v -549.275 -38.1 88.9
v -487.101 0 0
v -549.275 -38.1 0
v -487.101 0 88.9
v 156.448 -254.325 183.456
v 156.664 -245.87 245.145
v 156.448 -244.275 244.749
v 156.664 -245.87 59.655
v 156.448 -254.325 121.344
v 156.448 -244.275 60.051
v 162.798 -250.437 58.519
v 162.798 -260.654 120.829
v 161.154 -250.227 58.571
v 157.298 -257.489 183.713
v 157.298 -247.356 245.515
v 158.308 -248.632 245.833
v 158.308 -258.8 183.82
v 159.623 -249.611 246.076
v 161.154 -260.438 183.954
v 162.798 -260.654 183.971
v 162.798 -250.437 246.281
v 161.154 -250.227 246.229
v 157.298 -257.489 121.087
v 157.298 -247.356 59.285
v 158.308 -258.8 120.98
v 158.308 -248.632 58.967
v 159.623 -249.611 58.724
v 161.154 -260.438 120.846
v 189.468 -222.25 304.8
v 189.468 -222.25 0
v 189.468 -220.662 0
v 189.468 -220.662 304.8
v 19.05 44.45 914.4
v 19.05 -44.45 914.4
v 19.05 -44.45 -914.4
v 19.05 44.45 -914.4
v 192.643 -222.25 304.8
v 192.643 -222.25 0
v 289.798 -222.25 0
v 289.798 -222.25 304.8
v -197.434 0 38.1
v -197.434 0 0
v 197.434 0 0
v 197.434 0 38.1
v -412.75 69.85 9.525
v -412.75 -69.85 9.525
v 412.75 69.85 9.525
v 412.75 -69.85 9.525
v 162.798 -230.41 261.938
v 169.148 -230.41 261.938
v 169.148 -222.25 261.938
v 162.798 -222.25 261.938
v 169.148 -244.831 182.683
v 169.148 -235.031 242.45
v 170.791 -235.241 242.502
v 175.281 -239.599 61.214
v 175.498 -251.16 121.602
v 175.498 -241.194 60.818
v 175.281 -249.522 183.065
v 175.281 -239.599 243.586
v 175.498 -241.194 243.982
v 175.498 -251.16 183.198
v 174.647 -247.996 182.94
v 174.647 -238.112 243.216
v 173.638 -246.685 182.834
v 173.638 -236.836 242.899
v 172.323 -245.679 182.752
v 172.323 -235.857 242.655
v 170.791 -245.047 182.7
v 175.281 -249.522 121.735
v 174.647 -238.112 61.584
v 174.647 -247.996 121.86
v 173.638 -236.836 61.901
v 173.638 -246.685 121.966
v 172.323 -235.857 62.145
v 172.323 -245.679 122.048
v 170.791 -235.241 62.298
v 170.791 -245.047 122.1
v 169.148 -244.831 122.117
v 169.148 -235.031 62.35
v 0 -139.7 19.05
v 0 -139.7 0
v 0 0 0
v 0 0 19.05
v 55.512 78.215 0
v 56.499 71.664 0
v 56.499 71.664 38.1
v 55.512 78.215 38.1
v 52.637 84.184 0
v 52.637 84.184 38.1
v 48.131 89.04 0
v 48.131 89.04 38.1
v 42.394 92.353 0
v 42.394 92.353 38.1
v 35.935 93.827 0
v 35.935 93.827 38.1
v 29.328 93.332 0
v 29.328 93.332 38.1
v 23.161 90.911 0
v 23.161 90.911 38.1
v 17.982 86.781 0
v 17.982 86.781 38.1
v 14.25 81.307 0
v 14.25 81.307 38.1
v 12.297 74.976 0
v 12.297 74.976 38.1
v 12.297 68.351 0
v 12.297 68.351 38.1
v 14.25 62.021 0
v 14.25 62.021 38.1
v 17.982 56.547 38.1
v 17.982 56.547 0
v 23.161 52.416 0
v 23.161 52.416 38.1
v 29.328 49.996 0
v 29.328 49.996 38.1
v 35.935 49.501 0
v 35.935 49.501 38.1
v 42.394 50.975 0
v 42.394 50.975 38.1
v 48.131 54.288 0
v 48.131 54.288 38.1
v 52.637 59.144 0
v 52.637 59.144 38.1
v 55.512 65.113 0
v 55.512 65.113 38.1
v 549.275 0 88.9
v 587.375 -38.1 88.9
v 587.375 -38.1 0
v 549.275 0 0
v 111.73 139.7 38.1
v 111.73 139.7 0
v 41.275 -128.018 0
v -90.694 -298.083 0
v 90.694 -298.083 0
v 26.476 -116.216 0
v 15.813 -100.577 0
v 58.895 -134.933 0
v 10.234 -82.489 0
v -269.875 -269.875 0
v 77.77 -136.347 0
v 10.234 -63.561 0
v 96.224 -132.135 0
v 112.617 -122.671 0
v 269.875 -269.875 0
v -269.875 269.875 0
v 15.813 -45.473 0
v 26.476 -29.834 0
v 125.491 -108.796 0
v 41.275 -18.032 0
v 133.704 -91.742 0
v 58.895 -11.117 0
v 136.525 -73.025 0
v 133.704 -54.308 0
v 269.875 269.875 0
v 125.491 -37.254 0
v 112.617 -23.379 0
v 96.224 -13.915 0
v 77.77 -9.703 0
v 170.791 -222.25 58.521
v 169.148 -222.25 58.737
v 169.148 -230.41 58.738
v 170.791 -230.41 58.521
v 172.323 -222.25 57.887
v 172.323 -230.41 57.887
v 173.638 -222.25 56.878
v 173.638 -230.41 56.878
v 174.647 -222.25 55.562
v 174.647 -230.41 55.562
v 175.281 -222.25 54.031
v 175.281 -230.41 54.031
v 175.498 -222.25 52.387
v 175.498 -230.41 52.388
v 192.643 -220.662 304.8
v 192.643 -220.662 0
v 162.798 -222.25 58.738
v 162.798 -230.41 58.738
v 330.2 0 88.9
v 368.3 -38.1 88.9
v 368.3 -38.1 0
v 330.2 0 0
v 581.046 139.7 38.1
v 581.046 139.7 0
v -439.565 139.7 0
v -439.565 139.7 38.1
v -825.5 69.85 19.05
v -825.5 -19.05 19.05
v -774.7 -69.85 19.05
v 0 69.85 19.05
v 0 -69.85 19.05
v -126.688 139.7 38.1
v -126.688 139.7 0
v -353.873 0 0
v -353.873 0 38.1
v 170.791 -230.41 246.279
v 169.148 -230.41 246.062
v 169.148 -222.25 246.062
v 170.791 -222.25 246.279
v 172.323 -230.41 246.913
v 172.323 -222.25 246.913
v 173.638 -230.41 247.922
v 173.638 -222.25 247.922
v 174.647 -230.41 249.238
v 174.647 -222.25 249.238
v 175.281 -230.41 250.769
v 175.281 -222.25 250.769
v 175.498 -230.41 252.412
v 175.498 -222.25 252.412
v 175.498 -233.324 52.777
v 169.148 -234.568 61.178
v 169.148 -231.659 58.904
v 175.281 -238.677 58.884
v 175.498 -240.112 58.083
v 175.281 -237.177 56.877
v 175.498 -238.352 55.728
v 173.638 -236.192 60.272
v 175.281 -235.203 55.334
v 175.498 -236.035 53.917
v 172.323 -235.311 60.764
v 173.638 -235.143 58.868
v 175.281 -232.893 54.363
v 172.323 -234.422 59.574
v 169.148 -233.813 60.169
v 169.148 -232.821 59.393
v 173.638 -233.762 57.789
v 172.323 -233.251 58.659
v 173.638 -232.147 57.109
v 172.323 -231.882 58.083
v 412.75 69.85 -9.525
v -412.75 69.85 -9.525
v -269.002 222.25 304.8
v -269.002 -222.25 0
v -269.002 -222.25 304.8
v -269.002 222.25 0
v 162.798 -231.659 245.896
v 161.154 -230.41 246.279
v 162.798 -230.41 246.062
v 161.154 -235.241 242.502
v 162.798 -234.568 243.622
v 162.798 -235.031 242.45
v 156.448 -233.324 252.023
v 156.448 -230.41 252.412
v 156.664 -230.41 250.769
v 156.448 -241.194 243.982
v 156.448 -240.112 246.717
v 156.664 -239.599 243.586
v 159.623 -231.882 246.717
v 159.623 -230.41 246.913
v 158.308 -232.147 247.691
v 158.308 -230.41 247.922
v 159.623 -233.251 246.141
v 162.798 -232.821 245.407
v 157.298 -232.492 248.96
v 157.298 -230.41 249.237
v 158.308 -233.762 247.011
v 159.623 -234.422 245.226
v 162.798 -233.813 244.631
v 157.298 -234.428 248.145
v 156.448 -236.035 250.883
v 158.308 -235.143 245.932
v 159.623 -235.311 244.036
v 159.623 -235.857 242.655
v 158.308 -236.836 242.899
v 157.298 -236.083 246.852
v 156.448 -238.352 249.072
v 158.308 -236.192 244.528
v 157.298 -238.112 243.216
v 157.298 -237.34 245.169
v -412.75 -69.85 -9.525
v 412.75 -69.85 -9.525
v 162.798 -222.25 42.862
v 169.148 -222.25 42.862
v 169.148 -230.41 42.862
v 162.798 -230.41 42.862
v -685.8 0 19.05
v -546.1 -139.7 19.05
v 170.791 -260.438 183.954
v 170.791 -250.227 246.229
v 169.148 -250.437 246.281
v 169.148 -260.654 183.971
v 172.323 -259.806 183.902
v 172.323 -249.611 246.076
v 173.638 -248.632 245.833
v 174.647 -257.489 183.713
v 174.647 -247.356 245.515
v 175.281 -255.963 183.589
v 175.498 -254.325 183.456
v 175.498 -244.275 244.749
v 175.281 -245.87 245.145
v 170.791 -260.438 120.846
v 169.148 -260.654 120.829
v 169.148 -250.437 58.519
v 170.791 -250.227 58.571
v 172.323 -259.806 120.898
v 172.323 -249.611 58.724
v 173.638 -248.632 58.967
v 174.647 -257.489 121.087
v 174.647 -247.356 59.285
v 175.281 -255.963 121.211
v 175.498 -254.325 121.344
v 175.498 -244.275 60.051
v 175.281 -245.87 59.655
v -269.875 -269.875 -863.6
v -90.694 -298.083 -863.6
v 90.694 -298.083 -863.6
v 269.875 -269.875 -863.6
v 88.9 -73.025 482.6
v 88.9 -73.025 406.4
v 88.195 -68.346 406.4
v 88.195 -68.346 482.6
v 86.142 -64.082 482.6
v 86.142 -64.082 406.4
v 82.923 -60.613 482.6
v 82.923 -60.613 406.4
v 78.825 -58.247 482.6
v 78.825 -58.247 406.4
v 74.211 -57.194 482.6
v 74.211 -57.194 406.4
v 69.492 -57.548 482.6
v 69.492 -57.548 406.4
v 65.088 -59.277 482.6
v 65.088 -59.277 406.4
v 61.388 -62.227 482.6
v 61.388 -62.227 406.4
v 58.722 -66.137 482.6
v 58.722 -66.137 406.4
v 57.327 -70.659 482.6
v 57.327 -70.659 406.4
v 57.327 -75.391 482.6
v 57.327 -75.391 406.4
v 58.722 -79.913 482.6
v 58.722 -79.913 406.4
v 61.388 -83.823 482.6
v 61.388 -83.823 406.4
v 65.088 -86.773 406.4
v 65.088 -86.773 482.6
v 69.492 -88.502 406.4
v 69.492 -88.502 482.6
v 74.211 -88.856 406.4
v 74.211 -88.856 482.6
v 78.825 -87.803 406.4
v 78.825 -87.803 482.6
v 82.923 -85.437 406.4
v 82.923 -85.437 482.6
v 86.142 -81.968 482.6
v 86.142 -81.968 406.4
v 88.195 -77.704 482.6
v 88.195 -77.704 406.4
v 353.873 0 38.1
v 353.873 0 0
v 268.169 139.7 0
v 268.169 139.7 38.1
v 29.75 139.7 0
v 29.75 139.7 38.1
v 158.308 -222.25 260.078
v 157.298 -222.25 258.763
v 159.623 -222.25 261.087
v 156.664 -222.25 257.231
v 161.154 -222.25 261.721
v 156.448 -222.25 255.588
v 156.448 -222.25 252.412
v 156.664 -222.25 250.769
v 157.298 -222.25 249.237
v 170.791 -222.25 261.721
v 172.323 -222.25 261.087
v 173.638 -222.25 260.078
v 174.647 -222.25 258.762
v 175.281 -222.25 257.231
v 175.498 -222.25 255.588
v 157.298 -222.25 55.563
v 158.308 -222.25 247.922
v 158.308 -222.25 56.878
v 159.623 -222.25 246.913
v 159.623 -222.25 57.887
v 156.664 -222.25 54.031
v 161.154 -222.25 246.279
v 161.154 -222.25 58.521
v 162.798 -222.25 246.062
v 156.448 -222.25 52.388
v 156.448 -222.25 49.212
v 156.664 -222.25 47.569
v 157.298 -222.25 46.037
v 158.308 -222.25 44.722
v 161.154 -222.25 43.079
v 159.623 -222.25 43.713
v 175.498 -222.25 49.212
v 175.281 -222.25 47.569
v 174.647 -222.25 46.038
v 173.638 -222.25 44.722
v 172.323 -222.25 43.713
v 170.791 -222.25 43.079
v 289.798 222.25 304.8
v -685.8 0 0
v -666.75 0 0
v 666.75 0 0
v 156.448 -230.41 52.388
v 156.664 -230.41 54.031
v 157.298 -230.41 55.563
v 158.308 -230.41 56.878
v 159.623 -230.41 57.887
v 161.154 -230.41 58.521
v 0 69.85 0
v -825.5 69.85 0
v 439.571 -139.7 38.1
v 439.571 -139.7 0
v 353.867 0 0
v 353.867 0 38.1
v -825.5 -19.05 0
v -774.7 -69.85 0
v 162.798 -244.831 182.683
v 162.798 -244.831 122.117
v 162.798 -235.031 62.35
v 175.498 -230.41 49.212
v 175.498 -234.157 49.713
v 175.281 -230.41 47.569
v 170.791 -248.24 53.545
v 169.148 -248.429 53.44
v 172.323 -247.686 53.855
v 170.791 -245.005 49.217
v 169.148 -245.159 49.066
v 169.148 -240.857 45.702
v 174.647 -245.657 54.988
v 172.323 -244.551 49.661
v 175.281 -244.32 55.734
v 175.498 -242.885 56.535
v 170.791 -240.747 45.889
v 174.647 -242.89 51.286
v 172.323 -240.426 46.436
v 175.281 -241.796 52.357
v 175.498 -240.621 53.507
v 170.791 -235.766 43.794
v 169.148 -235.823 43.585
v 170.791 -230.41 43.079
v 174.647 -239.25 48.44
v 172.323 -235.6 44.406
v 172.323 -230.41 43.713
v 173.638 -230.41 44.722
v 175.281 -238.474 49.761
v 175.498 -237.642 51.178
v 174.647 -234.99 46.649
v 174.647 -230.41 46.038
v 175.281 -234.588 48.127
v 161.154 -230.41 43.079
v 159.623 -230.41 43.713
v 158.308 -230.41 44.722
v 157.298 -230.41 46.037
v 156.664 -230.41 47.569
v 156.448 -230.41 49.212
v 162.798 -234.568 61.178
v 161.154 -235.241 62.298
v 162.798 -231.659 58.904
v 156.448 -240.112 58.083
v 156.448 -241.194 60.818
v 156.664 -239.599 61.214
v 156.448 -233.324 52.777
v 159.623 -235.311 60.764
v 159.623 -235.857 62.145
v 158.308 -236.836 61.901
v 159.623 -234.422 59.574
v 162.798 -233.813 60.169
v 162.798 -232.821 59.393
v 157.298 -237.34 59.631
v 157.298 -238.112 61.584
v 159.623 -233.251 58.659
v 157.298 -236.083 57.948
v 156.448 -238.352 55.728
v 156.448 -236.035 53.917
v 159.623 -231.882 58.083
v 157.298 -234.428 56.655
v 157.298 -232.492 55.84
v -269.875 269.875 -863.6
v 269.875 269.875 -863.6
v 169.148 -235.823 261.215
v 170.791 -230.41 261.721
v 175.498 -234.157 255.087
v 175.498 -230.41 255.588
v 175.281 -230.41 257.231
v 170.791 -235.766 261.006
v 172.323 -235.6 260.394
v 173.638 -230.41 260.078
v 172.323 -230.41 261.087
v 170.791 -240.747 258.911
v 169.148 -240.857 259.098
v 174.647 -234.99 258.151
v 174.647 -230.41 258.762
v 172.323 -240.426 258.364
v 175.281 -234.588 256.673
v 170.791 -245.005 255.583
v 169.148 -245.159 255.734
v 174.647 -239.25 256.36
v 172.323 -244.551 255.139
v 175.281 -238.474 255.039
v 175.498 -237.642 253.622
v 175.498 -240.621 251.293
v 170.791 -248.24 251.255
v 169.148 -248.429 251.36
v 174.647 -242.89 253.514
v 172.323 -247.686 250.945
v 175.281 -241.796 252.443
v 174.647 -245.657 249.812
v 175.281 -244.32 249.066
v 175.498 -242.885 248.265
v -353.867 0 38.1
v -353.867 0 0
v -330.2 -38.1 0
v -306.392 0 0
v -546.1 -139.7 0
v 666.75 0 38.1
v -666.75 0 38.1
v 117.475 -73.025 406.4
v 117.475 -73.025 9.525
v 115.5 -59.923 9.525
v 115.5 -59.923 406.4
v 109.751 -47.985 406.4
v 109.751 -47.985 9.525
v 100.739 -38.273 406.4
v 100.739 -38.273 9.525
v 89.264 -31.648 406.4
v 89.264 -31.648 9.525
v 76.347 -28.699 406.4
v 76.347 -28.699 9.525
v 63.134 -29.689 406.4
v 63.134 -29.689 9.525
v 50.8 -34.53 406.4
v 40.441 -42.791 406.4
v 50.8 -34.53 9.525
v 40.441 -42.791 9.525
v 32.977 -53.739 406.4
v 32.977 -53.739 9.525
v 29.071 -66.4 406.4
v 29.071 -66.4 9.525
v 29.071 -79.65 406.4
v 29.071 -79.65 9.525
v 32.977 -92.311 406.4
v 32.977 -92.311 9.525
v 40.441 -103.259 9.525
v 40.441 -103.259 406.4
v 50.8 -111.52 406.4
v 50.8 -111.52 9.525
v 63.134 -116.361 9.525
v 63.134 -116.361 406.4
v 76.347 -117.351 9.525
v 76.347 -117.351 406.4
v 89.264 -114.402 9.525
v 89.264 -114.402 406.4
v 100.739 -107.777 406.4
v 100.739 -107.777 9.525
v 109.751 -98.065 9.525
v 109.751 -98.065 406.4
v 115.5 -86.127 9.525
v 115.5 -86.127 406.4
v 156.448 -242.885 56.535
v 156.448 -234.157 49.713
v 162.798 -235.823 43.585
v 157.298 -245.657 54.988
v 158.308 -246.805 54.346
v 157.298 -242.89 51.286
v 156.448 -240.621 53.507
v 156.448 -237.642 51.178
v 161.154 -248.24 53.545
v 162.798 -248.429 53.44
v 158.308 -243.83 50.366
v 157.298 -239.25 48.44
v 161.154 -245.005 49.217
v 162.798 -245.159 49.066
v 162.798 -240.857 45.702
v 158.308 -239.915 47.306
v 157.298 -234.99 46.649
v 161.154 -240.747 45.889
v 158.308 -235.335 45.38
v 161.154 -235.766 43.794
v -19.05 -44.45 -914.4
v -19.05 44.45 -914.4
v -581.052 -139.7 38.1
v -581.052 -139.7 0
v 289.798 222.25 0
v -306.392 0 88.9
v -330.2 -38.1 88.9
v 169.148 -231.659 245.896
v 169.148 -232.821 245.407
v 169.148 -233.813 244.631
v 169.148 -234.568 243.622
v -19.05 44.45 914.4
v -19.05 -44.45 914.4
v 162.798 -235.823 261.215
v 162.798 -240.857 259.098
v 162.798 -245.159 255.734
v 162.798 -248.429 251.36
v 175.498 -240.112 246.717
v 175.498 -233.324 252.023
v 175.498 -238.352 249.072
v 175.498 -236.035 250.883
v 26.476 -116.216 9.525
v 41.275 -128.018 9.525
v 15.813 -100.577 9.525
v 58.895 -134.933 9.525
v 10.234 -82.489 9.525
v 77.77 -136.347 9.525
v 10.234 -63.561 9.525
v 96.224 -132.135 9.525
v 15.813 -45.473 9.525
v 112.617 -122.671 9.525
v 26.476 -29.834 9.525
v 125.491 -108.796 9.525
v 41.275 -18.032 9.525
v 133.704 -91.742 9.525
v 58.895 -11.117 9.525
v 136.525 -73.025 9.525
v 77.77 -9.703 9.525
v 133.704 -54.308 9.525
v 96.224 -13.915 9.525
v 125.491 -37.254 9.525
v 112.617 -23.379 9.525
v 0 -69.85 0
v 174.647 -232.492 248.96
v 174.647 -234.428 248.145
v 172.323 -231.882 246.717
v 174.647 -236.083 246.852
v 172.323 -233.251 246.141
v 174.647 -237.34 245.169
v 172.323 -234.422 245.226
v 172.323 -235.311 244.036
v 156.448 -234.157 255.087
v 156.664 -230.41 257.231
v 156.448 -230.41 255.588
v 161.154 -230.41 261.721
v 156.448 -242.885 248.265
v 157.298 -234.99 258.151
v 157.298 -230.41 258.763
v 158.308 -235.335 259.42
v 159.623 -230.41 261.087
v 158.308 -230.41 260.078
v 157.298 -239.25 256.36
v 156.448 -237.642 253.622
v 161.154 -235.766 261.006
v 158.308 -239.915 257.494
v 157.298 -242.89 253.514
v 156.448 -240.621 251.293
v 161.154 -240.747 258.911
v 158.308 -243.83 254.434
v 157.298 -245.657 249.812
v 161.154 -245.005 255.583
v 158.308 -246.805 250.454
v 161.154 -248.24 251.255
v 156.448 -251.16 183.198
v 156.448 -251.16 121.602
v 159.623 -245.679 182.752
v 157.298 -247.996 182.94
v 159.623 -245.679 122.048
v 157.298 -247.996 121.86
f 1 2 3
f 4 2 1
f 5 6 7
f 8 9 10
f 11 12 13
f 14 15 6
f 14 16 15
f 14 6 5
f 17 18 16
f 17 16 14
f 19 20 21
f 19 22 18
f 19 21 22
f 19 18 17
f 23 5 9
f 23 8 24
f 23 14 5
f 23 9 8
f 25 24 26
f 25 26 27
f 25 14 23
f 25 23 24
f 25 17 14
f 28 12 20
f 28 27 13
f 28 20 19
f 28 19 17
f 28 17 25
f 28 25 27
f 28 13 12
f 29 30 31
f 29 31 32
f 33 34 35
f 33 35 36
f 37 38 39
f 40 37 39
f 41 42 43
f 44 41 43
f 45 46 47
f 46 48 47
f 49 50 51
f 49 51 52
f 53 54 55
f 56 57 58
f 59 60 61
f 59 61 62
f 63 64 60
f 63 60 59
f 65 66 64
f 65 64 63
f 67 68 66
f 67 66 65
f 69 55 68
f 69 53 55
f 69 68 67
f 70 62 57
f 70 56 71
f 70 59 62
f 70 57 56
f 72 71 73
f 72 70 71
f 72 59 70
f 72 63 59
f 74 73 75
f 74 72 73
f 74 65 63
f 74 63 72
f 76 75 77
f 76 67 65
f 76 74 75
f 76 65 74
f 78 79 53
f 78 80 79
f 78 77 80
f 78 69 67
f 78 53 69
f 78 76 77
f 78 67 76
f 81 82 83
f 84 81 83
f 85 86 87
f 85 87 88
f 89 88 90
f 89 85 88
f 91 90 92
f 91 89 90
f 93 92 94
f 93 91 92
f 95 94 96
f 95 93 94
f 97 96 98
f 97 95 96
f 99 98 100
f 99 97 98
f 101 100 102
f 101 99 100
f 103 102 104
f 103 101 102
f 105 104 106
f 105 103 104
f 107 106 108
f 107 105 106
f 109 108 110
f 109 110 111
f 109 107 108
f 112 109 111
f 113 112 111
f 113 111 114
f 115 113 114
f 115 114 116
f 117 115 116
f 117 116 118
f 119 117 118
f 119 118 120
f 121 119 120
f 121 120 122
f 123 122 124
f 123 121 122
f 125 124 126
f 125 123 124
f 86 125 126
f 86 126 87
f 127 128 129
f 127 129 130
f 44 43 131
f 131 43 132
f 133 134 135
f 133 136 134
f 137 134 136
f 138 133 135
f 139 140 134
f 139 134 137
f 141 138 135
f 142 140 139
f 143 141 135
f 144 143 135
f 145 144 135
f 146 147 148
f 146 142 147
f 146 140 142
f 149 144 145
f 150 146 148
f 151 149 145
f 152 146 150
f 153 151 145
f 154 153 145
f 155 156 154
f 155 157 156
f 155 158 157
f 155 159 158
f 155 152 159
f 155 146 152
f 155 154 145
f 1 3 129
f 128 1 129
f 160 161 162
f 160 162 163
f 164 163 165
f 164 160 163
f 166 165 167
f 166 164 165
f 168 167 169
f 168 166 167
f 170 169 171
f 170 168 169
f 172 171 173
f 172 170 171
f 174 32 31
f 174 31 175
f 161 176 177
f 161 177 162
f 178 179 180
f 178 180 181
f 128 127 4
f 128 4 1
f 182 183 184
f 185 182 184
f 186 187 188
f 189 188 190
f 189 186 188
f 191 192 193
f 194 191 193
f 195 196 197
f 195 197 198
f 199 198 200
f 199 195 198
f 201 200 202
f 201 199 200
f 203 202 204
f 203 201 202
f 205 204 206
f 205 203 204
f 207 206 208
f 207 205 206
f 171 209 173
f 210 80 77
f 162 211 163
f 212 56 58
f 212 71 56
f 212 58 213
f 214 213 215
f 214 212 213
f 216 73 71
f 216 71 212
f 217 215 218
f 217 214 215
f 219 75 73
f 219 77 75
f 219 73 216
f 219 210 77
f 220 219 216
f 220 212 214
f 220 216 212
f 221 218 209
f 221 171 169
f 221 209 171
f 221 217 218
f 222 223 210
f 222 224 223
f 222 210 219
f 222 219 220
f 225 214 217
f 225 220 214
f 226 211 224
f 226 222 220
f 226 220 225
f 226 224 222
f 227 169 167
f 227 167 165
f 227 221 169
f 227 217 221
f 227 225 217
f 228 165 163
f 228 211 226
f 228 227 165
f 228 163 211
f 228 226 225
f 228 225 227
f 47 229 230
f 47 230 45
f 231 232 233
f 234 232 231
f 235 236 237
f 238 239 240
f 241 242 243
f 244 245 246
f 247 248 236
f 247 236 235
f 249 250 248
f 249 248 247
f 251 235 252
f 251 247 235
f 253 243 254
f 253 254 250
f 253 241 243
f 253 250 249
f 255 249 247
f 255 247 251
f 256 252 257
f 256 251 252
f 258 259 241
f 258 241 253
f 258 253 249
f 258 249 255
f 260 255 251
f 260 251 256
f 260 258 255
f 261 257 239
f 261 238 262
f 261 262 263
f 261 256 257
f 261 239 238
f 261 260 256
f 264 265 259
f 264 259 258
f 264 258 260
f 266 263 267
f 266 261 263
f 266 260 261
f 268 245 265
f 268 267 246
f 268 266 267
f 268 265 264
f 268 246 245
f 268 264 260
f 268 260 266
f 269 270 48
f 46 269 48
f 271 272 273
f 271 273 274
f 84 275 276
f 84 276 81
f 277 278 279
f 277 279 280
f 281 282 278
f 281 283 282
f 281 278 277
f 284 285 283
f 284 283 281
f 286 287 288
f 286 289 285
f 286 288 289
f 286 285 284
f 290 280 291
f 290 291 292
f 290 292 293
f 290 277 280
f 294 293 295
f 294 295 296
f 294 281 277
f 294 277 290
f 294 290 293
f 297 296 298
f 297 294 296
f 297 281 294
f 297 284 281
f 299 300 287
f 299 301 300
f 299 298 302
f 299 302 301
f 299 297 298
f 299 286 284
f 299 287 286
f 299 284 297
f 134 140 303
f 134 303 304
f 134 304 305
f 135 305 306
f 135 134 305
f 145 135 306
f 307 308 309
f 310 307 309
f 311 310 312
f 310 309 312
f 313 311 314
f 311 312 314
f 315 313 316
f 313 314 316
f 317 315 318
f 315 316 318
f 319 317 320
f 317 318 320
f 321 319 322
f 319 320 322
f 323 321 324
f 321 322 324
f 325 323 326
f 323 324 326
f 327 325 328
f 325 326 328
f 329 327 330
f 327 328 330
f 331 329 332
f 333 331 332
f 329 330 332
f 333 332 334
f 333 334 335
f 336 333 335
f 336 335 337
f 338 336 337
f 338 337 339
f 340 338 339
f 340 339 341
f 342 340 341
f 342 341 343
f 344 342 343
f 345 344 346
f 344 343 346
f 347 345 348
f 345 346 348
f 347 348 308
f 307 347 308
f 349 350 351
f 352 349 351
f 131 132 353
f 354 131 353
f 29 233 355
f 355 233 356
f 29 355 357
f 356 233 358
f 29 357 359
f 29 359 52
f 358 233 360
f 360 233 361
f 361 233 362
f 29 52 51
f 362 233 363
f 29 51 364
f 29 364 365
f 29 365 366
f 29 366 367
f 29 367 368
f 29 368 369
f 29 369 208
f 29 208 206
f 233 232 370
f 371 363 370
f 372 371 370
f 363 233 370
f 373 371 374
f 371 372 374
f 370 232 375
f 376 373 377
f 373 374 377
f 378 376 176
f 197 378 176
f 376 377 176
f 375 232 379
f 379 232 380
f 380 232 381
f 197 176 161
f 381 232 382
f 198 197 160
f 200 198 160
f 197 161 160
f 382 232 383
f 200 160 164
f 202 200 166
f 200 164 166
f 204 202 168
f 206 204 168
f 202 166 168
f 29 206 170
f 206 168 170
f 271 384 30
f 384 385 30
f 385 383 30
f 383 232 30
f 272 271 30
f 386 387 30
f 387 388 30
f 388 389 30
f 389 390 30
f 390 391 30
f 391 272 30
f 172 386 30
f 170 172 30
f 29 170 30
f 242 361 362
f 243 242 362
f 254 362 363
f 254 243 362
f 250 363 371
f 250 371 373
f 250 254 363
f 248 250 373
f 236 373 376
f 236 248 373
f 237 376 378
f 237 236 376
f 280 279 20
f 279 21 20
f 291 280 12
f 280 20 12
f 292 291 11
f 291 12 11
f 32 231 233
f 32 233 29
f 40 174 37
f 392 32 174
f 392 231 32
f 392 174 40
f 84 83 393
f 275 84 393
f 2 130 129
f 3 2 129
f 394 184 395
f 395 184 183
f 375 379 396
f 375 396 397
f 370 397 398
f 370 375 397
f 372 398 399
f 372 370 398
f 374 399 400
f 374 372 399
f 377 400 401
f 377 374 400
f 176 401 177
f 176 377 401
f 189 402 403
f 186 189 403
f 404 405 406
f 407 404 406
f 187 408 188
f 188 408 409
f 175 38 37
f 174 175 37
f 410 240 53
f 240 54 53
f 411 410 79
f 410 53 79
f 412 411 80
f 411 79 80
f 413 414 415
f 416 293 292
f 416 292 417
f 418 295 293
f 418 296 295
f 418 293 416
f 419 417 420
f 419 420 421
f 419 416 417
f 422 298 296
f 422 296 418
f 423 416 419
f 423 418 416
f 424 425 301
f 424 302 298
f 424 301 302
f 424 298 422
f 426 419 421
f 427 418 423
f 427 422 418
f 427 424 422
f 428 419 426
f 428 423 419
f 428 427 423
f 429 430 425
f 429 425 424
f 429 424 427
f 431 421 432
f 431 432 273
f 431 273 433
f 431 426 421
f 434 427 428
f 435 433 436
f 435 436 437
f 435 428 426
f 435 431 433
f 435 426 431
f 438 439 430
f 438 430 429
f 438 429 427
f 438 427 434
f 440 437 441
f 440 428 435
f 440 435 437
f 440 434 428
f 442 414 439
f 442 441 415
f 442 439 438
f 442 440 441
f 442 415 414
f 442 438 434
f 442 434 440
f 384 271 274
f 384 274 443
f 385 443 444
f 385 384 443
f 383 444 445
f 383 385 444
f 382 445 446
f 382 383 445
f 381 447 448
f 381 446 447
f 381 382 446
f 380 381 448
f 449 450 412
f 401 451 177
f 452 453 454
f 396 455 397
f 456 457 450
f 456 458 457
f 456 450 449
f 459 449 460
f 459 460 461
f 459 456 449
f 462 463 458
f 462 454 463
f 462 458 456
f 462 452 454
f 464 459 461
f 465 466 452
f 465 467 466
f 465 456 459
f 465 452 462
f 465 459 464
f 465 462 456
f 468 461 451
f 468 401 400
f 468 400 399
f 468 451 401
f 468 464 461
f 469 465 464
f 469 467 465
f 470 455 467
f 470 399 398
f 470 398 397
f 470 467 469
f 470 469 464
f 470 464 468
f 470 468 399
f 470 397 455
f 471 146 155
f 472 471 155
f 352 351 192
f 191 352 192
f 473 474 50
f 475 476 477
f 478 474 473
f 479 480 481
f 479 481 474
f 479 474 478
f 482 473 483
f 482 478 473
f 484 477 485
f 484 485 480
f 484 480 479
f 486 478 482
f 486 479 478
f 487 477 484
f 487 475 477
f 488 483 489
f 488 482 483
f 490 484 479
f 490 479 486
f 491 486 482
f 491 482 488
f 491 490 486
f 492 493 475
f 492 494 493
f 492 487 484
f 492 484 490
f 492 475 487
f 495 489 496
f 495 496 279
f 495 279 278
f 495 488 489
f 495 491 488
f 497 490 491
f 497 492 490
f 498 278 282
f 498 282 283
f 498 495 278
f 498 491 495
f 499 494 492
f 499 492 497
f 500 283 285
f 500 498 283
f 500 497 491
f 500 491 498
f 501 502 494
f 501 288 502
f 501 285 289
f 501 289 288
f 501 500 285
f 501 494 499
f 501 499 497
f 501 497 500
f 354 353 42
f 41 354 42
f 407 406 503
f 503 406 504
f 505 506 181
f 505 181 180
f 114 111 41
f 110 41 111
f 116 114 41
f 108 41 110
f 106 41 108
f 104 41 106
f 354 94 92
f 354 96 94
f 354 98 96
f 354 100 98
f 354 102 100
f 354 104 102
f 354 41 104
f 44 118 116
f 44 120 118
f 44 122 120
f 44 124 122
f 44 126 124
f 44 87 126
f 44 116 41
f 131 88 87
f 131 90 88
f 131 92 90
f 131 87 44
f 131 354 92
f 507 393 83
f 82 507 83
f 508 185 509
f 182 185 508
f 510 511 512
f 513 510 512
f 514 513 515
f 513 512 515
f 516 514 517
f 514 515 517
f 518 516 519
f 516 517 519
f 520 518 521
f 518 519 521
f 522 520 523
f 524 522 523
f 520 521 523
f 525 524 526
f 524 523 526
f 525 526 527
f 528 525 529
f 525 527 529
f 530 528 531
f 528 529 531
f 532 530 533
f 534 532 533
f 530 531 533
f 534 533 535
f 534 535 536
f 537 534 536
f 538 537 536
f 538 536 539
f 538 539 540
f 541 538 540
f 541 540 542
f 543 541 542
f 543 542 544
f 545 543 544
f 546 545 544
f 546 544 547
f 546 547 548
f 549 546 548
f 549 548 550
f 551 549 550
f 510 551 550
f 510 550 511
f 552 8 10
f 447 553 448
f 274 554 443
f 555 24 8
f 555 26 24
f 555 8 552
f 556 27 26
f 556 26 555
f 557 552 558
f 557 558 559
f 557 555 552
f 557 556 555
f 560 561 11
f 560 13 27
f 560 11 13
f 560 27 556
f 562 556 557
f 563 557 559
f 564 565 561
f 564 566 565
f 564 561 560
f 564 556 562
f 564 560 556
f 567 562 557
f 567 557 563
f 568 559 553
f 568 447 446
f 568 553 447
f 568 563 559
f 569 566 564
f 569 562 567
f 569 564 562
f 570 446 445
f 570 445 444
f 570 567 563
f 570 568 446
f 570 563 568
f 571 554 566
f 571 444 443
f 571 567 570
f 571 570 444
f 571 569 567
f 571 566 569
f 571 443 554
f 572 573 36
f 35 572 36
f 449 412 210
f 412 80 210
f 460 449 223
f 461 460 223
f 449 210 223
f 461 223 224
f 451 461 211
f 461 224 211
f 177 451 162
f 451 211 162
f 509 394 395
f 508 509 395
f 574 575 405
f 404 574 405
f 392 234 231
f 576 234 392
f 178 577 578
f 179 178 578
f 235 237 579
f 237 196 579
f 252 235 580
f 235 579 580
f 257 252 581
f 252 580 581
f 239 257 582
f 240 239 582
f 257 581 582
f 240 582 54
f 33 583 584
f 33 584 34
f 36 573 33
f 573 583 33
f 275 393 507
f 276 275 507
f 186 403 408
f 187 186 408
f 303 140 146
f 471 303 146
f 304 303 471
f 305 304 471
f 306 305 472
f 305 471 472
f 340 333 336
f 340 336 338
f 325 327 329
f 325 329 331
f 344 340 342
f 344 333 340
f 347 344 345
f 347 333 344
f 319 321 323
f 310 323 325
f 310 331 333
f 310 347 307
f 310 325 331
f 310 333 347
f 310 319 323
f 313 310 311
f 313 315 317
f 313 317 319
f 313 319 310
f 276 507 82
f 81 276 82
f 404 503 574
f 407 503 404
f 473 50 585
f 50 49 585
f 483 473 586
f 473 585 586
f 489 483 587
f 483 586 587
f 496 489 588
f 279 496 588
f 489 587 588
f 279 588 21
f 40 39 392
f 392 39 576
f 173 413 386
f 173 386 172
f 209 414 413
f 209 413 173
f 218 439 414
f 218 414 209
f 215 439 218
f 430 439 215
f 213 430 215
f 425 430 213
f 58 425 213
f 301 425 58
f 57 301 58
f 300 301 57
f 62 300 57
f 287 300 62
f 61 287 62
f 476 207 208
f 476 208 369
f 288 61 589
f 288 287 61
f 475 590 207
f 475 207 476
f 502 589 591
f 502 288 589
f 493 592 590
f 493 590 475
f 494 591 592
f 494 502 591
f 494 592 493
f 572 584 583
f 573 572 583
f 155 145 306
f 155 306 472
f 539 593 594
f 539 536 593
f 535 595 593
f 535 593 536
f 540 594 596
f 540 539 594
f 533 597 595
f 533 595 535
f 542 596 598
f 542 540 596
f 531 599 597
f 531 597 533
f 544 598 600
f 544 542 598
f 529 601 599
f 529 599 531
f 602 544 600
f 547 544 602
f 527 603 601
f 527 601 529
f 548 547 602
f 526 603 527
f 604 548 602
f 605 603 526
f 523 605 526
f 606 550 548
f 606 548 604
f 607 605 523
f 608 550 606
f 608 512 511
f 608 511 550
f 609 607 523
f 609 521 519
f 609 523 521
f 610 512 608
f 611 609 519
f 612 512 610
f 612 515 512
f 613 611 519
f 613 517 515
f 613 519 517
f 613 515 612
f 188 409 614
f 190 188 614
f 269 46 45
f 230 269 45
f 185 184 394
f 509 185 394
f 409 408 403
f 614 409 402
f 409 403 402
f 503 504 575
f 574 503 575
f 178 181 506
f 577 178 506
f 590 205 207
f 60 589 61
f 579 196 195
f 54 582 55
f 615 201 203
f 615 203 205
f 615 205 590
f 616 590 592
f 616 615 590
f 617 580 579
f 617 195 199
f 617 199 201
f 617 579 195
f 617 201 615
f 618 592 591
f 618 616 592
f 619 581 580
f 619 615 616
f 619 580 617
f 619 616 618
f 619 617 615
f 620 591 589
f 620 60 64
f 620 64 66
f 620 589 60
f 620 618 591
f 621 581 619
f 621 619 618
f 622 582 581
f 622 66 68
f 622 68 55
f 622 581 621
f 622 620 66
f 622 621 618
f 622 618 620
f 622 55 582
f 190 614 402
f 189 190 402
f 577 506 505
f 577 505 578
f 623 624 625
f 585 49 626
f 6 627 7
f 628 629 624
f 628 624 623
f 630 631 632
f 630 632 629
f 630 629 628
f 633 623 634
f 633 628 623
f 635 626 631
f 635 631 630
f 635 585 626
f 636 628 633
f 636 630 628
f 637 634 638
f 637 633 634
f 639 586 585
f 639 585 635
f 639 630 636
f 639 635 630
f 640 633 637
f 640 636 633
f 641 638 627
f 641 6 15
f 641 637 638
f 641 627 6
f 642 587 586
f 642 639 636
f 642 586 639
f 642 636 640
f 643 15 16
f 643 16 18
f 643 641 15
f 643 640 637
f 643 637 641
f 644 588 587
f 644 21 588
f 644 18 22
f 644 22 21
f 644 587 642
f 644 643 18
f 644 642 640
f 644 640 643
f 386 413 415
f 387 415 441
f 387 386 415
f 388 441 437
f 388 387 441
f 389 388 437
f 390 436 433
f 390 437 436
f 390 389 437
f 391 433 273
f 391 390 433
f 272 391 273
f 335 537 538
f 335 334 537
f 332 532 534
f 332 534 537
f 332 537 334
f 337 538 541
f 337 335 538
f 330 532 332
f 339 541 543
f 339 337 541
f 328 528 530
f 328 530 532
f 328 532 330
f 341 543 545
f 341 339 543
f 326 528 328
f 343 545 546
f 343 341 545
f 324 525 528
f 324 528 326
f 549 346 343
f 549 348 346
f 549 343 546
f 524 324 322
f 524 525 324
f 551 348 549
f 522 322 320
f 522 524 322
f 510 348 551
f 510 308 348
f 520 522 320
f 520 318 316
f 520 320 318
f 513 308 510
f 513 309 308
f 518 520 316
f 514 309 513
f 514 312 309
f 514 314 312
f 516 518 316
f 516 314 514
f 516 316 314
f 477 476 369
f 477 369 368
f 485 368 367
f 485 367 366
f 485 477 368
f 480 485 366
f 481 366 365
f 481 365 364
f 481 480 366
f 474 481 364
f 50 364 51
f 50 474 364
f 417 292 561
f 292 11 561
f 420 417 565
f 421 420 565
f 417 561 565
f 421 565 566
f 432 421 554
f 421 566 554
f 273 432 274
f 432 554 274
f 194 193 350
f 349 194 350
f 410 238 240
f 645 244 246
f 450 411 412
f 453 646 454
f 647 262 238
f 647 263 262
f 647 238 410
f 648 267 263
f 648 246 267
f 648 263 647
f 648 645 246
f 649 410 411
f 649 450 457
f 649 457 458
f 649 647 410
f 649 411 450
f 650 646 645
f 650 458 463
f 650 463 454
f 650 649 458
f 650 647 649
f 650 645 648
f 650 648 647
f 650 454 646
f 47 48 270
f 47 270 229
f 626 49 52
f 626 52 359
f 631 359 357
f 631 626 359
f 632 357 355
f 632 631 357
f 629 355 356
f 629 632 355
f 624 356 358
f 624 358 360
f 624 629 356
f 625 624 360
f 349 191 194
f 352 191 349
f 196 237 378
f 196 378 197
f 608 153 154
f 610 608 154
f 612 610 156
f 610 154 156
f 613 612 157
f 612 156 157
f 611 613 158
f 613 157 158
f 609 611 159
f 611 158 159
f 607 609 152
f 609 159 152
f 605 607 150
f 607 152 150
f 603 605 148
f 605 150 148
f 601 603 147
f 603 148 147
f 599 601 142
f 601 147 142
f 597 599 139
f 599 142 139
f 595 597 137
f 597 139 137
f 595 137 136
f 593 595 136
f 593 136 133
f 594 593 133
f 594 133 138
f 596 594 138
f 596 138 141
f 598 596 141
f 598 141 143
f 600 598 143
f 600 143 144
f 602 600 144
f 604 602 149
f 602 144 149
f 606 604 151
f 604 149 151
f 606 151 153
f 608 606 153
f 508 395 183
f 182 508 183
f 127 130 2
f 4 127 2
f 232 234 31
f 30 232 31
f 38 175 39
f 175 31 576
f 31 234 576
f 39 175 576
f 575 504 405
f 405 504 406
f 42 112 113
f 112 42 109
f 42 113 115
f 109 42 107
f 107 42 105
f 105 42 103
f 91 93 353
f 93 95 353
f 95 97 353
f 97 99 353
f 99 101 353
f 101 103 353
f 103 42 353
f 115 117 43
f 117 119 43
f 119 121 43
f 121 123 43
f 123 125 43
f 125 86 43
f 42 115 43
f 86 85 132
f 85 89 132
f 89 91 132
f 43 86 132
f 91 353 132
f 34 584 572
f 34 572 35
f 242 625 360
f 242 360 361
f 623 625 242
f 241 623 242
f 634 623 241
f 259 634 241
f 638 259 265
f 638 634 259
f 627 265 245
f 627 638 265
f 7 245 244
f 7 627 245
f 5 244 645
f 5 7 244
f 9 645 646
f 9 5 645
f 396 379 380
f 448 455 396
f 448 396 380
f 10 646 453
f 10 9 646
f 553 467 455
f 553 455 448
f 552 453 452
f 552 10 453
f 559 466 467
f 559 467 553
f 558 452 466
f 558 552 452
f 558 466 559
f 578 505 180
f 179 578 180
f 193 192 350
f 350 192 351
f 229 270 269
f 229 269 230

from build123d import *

# Parameters (mm, degrees)
F0_W      = 539.75
F0_H      = 539.75
F0_R      = 63.5
F0_R_2    = 44.45
F1_DEPTH  = 863.6
F2_DEPTH  = 406.4
F3_DEPTH  = 9.525
F6_R      = 15.875
F7_DEPTH  = 76.2
F8_W      = 558.8
F8_H      = 444.5
F9_DEPTH  = 304.8
F14_W     = 3.175
F14_H     = 304.8
F15_DEPTH = 1.5875
F16_W     = 139.7
F16_H     = 19.05
F17_DEPTH = 412.75
F19_DEPTH = 19.05
F21_DEPTH = 19.05
F22_W     = 38.1
F22_H     = 88.9
F23_DEPTH = 914.4
F25_DEPTH = 38.1
F27_DEPTH = 88.9
F29_DEPTH = 88.9
F30_SIZE2 = 23.807512
F30_SIZE  = 38.09999
F31_SIZE2 = 62.173539
F31_SIZE  = 38.09999
F33_DEPTH = 38.1
F35_DEPTH = 38.1
F36_R     = 22.225
F37_DEPTH = 38.1


# Not quite as in the source:
# - a fillet or chamfer is up to 0.001 mm smaller than in the source, because OpenCascade refuses the exact size


with BuildPart() as f1:
    # F0 (on Top) → F1 (new body)
    with BuildSketch(Plane.XY):
        Rectangle(F0_W, F0_H)
        with Locations((73.025, -73.025)):
            Circle(F0_R, mode=Mode.SUBTRACT)
        with BuildLine():
            ThreePointArc((-269.875, -269.875), (0, -301.625), (269.875, -269.875))
            Line((269.875, -269.875), (-269.875, -269.875))
        make_face()
        with Locations((73.025, -73.025)):
            Circle(F0_R)
        with Locations((73.025, -73.025)):
            Circle(F0_R_2, mode=Mode.SUBTRACT)
        with Locations((73.025, -73.025)):
            Circle(F0_R_2)
    extrude(amount=-F1_DEPTH)

    # F0 (on Top) → F2 (join)
    with BuildSketch(Plane.XY):
        with Locations((73.025, -73.025)):
            Circle(F0_R_2)
    extrude(amount=F2_DEPTH)

    # F0 (on Top) → F3 (join)
    with BuildSketch(Plane.XY):
        with Locations((73.025, -73.025)):
            Circle(F0_R)
        with Locations((73.025, -73.025)):
            Circle(F0_R_2, mode=Mode.SUBTRACT)
    extrude(amount=F3_DEPTH)

    # F6 (on face) → F7 (join)
    with BuildSketch(Plane.XY.offset(406.4)):
        with Locations((73.025, -73.025)):
            Circle(F6_R)
    extrude(amount=F7_DEPTH)


with BuildPart() as f9:
    # F8 (on Top) → F9 (new body)
    with BuildSketch(Plane.XY):
        with Locations((10.3976642355, 0)):
            Rectangle(F8_W, F8_H)
    extrude(amount=F9_DEPTH)

    # F13: sweep along a path in F12
    with BuildLine(Plane.YZ.offset(161.925)) as f13_path:
        Line((-222.25, 254), (-230.4096808985, 254))
        ThreePointArc((-230.4096808985, 254), (-238.2313792766, 251.3055501839), (-242.7341526537, 244.3655172414))
        ThreePointArc((-242.7341526537, 244.3655172414), (-254, 152.4), (-242.7341526537, 60.4344827586))
        ThreePointArc((-242.7341526537, 60.4344827586), (-238.2313792766, 53.4944498161), (-230.4096808985, 50.8))
        Line((-230.4096808985, 50.8), (-222.25, 50.8))
    # F10 (on face) → F13 (sweep)
    with BuildSketch(Plane.XZ.offset(222.25)):
        with BuildLine():
            Line((162.7976642355, 246.0625), (169.1476642355, 246.0625))
            ThreePointArc((169.1476642355, 246.0625), (173.637792296, 247.9223719395), (175.4976642355, 252.4125))
            Line((175.4976642355, 252.4125), (175.4976642355, 255.5875))
            ThreePointArc((175.4976642355, 255.5875), (173.637792296, 260.0776280605), (169.1476642355, 261.9375))
            Line((169.1476642355, 261.9375), (162.7976642355, 261.9375))
            ThreePointArc((162.7976642355, 261.9375), (158.3075361749, 260.0776280605), (156.4476642355, 255.5875))
            Line((156.4476642355, 255.5875), (156.4476642355, 252.4125))
            ThreePointArc((156.4476642355, 252.4125), (158.3075361749, 247.9223719395), (162.7976642355, 246.0625))
        make_face()
    sweep(path=f13_path.line)

    # F14 (on face) → F15 (cut)
    with BuildSketch(Plane.XZ.offset(222.25)):
        with Locations((191.0551642355, 152.4)):
            Rectangle(F14_W, F14_H)
    extrude(amount=-F15_DEPTH, mode=Mode.SUBTRACT)


with BuildPart() as f17:
    # F16 (on Right) → F17 (new body, symmetric)
    with BuildSketch(Plane.YZ):
        Rectangle(F16_W, F16_H)
    extrude(amount=F17_DEPTH, both=True)


with BuildPart() as f19:
    # F18 (on Top) → F19 (new body)
    with BuildSketch(Plane.XY):
        Polygon((-825.5, -19.05), (-774.7, -69.85), (0, -69.85), (0, 69.85), (-825.5, 69.85), align=None)
    extrude(amount=F19_DEPTH)


with BuildPart() as f21:
    # F20 (on Top) → F21 (new body)
    with BuildSketch(Plane.XY):
        Polygon((0, -139.7), (0, 0), (-685.8, 0), (-546.1, -139.7), align=None)
    extrude(amount=F21_DEPTH)


with BuildPart() as f23:
    # F22 (on Top) → F23 (new body, symmetric)
    with BuildSketch(Plane.XY):
        Rectangle(F22_W, F22_H)
    extrude(amount=F23_DEPTH, both=True)


with BuildPart() as f25:
    # F24 (on Top) → F25 (new body)
    with BuildSketch(Plane.XY):
        Polygon((-666.75, 0), (666.75, 0), (581.0462384661, 139.7), (-439.5653237969, 139.7), align=None)
    extrude(amount=F25_DEPTH)


with BuildPart() as f27:
    # F26 (on Top) → F27 (new body)
    with BuildSketch(Plane.XY):
        Polygon((549.275, 0), (-549.275, 0), (-549.275, -38.1), (587.375, -38.1), align=None)
    extrude(amount=F27_DEPTH)

    # F31 (size 38.1 and 62.1735492796 in the source; OpenCascade refuses exactly that, so slightly less here)
    f31_edges = [f27.edges().sort_by_distance(p)[0] for p in [
        (-549.275, 0, 44.45),
    ]]
    f31_side = f27.faces().sort_by_distance((-549.275, -19.05, 44.45))[0]
    chamfer(f31_edges, length=F31_SIZE, length2=F31_SIZE2, reference=f31_side)


with BuildPart() as f29:
    # F28 (on Top) → F29 (new body)
    with BuildSketch(Plane.XY):
        Polygon((330.2, 0), (-330.2, 0), (-330.2, -38.1), (368.3, -38.1), align=None)
    extrude(amount=F29_DEPTH)

    # F30 (size 38.1 and 23.8075223077 in the source; OpenCascade refuses exactly that, so slightly less here)
    f30_edges = [f29.edges().sort_by_distance(p)[0] for p in [
        (-330.2, 0, 44.45),
    ]]
    f30_side = f29.faces().sort_by_distance((-330.2, -19.05, 44.45))[0]
    chamfer(f30_edges, length=F30_SIZE, length2=F30_SIZE2, reference=f30_side)


with BuildPart() as f33:
    # F32 (on Top) → F33 (new body)
    with BuildSketch(Plane.XY):
        Polygon((-581.0518573346, -139.7), (439.5709426654, -139.7), (353.8671811315, 0), (-353.8671811315, 0), align=None)
    extrude(amount=F33_DEPTH)


with BuildPart() as f35:
    # F34 (on Top) → F35 (new body)
    with BuildSketch(Plane.XY):
        Polygon((-353.8728, 0), (353.8728, 0), (268.1690384661, 139.7), (-126.6881237969, 139.7), align=None)
    extrude(amount=F35_DEPTH)


with BuildPart() as f37:
    # F36 (on Top) → F37 (new body)
    with BuildSketch(Plane.XY):
        Polygon((-197.4342, 0), (197.4342, 0), (111.7304384661, 139.7), (29.7504762031, 139.7), align=None)
        with Locations((34.2739268669, 71.6638964194)):
            Circle(F36_R, mode=Mode.SUBTRACT)
    extrude(amount=F37_DEPTH)


solid = Compound([f1.part, f9.part, f17.part, f19.part, f21.part, f23.part, f25.part, f27.part, f29.part, f33.part, f35.part, f37.part])
